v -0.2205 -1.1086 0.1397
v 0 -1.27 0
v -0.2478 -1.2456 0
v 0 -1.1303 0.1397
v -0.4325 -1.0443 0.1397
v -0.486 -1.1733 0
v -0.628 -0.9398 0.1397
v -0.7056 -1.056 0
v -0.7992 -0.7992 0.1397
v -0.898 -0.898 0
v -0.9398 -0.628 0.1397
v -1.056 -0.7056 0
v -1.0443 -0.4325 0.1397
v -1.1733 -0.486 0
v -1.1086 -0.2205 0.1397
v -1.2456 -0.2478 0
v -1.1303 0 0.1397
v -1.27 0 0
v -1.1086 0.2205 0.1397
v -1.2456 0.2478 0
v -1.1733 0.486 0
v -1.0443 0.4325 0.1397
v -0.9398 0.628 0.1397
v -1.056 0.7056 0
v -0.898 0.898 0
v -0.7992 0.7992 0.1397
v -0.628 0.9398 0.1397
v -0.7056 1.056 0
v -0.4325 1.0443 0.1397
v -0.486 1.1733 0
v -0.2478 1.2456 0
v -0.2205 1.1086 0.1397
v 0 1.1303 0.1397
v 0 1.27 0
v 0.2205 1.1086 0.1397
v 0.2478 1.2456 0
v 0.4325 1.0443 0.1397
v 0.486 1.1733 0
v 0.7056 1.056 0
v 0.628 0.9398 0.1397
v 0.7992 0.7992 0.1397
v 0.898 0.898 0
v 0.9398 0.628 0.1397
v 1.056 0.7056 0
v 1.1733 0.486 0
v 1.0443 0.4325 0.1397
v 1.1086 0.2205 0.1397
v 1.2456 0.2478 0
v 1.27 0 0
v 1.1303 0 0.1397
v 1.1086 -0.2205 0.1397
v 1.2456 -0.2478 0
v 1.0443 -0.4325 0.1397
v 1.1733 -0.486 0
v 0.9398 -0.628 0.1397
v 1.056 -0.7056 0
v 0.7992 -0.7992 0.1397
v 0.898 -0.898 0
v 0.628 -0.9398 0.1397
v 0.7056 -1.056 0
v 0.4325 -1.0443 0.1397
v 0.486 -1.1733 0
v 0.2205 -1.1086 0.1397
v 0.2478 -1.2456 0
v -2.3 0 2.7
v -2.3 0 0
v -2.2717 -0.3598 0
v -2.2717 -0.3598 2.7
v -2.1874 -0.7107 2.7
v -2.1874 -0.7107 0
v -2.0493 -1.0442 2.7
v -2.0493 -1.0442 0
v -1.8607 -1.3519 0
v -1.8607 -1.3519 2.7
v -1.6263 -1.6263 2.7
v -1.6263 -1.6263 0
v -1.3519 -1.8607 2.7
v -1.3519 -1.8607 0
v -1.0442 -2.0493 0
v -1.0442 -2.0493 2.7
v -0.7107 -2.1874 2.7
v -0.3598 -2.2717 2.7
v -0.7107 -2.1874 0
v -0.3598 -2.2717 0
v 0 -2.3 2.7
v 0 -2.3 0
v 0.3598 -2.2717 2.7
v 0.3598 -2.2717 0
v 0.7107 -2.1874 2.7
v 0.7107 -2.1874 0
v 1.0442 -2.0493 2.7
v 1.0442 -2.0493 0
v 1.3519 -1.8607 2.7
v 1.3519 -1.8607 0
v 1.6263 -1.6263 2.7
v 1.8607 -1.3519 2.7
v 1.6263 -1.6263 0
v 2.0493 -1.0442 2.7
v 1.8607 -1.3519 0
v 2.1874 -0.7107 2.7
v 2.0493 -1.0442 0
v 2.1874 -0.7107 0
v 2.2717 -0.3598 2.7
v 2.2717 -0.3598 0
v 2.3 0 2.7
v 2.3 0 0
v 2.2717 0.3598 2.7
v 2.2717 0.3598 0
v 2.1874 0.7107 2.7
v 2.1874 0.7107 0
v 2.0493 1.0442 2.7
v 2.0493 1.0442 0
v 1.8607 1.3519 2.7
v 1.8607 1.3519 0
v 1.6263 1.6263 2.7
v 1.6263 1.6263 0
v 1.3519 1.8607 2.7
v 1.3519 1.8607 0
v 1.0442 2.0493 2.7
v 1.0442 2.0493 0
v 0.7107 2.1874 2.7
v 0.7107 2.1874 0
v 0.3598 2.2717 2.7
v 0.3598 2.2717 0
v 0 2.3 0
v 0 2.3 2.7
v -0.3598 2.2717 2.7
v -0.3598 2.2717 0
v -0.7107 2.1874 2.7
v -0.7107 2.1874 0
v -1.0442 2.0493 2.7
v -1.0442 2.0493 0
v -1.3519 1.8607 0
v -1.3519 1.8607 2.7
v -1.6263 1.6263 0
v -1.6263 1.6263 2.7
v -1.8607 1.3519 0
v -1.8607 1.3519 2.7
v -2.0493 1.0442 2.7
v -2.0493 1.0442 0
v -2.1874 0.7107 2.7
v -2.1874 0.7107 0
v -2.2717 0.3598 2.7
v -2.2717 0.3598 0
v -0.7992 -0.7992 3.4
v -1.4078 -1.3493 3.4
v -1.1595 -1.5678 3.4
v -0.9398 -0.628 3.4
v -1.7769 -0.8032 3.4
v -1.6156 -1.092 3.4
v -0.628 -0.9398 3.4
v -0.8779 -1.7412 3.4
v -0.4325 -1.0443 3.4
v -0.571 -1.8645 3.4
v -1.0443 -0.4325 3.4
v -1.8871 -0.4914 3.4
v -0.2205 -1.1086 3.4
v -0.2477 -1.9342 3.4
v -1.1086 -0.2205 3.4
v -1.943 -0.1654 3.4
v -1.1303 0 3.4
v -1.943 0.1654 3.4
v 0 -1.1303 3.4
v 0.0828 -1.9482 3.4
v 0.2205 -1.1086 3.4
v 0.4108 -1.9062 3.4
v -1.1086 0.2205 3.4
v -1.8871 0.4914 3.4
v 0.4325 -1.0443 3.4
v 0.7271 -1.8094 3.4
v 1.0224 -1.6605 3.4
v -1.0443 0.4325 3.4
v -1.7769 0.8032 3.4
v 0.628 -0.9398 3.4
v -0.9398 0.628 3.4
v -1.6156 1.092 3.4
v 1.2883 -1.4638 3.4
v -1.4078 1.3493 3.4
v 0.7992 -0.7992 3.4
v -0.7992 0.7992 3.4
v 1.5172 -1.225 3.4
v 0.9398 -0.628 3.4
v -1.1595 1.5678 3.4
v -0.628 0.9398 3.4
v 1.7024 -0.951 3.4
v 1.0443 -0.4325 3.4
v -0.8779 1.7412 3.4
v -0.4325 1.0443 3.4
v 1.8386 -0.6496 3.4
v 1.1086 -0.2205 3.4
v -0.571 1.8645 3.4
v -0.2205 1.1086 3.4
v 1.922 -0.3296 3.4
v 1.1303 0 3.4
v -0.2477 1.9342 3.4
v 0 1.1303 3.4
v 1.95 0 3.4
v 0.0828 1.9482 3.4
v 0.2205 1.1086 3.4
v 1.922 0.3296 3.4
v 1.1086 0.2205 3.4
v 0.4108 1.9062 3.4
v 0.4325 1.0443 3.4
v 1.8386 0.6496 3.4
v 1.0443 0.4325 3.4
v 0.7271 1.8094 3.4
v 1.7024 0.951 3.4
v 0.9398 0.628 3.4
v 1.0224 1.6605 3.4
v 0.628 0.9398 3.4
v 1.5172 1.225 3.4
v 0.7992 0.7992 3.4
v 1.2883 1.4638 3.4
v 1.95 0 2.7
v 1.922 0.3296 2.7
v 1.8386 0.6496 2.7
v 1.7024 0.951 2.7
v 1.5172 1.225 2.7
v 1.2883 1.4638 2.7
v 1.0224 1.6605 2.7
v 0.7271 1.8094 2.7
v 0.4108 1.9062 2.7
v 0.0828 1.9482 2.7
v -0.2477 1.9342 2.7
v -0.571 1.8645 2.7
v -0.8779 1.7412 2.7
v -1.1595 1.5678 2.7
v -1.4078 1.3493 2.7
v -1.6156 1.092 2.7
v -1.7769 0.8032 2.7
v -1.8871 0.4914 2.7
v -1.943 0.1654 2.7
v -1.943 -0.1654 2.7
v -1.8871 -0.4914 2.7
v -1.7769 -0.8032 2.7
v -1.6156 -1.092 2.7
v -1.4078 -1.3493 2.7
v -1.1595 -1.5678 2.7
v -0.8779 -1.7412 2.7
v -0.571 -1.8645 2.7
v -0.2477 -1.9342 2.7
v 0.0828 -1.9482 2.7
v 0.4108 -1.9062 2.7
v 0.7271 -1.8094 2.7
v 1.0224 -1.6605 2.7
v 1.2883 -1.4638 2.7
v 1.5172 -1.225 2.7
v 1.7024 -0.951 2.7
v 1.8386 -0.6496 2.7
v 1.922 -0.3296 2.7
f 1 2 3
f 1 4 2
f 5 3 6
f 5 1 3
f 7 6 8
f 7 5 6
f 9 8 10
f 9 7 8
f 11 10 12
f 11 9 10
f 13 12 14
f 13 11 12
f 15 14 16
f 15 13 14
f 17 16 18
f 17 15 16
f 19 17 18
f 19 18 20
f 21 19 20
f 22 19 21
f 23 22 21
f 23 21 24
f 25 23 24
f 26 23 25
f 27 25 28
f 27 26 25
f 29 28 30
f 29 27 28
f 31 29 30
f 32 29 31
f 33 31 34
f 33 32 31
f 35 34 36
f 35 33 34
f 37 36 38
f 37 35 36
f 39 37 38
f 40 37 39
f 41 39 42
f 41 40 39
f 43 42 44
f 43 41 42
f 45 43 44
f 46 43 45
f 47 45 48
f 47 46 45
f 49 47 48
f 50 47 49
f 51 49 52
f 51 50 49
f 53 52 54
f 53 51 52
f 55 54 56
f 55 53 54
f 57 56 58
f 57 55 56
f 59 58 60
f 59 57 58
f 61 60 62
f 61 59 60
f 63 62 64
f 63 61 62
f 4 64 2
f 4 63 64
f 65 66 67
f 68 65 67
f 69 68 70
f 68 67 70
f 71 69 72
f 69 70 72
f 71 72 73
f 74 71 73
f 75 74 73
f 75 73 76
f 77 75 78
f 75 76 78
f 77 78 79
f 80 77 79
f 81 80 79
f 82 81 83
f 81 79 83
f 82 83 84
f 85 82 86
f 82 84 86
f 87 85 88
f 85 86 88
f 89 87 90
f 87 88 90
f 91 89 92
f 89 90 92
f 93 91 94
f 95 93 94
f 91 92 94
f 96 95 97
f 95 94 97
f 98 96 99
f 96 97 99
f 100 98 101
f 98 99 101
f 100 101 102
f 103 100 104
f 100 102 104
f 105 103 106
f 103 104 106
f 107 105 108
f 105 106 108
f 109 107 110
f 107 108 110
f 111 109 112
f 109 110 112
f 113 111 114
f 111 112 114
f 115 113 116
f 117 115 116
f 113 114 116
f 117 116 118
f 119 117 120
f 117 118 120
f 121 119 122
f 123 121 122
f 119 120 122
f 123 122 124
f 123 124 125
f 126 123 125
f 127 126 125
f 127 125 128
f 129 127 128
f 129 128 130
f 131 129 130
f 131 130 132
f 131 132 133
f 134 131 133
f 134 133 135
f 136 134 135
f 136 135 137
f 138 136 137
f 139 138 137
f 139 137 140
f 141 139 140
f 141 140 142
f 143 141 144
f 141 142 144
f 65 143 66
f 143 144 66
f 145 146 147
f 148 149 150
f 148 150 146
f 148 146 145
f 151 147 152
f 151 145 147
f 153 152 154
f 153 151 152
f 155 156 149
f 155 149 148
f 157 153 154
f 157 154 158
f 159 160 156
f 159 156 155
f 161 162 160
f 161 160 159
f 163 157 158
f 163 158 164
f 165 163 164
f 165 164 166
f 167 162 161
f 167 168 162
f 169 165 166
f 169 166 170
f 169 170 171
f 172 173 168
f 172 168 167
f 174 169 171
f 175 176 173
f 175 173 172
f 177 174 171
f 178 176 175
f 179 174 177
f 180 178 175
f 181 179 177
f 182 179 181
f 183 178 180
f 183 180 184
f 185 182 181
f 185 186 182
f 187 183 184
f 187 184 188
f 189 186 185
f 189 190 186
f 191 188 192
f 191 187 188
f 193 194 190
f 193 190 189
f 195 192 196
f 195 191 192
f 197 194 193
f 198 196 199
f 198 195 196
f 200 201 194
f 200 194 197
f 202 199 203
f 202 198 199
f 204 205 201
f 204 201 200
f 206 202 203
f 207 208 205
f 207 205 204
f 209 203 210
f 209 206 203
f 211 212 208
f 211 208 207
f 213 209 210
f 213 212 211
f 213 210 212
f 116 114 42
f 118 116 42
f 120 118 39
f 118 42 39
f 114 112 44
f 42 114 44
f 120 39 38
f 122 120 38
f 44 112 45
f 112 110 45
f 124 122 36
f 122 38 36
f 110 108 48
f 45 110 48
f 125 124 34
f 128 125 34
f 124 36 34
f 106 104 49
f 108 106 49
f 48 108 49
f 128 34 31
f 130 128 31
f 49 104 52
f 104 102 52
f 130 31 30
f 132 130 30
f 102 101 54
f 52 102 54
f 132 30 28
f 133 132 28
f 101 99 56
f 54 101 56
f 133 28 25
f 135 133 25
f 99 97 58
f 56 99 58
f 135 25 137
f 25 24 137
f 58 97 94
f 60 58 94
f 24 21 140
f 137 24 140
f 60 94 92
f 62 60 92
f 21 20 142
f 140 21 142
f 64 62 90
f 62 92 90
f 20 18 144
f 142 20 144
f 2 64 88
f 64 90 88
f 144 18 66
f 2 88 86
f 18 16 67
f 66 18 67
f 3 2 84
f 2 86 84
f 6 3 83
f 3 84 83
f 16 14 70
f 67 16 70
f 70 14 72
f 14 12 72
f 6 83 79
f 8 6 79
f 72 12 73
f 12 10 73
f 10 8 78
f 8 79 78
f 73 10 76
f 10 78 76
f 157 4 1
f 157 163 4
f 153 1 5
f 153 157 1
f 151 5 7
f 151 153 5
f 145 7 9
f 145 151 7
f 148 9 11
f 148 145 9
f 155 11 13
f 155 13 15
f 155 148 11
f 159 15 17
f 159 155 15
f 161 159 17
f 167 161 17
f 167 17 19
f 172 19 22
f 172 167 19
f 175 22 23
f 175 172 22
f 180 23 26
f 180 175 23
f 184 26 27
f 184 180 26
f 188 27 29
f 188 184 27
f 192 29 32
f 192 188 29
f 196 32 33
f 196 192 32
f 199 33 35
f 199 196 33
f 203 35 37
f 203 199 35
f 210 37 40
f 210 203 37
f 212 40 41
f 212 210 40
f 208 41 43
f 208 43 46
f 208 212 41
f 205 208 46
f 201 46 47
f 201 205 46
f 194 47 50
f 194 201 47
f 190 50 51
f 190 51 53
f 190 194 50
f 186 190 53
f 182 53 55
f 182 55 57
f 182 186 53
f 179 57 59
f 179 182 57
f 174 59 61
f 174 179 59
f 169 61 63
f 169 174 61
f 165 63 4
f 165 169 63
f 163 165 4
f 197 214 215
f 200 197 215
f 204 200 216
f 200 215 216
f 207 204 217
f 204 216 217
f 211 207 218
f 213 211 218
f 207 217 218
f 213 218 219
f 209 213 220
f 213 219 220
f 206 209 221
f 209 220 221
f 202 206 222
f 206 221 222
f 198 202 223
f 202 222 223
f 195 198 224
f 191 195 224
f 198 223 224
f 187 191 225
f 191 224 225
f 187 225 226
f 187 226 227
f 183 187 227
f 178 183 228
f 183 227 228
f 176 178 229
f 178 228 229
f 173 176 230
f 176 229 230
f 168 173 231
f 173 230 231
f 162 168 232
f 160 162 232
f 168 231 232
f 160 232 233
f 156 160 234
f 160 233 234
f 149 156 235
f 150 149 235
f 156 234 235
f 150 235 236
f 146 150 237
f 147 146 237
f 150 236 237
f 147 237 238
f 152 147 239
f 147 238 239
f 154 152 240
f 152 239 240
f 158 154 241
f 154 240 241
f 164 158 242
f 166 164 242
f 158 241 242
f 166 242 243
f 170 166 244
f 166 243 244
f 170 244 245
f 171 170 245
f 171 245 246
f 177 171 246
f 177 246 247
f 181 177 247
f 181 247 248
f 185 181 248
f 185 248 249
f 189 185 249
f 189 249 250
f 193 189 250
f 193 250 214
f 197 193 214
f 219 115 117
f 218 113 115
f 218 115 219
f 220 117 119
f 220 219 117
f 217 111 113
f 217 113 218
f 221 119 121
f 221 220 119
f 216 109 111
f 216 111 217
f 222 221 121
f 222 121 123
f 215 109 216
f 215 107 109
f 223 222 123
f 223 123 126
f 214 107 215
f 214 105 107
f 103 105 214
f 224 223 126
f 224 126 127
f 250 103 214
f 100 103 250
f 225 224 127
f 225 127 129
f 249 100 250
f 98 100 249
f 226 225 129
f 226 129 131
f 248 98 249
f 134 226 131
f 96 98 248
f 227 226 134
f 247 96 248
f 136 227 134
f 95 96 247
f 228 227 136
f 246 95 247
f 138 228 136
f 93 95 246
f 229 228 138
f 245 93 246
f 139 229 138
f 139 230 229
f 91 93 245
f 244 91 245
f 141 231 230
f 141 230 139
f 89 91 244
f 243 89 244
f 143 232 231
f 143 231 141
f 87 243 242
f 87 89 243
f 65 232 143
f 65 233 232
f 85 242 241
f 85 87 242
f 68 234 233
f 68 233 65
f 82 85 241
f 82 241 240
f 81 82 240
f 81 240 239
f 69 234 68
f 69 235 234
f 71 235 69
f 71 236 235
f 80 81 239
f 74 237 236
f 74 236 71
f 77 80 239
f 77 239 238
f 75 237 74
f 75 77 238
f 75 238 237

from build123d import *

# Parameters (mm, degrees)
ESQUISSE1_R      = 2.3
EXTRUSION1_DEPTH = 2.7
ESQUISSE2_R      = 1.95
EXTRUSION2_DEPTH = 0.7


with BuildPart() as part:
    # Esquisse1 → Extrusion1 (new body)
    with BuildSketch(Plane.XY):
        with Locations(Location((0, 0, 0), (0, 0, 180))):
            Circle(ESQUISSE1_R)
    extrude(amount=EXTRUSION1_DEPTH)

    # Esquisse2 → Extrusion2 (add)
    with BuildSketch(Plane.XY.offset(2.7)):
        Circle(ESQUISSE2_R)
    extrude(amount=EXTRUSION2_DEPTH)

    # Esquisse4 → #4-40 Tapped Hole1 (revolve, cut)
    with BuildSketch(Plane(origin=(0, 0, 3.4), x_dir=(0, -1, 0), z_dir=(1, 0, 0))):
        Polygon((0, 0), (0, 3.4), (1.27, 3.4), (1.1303, 3.2603), (1.1303, 0), align=None)
    revolve(axis=Axis((0, 0, 9.75), (0, 0, -1)), mode=Mode.SUBTRACT)


solid = part.part
